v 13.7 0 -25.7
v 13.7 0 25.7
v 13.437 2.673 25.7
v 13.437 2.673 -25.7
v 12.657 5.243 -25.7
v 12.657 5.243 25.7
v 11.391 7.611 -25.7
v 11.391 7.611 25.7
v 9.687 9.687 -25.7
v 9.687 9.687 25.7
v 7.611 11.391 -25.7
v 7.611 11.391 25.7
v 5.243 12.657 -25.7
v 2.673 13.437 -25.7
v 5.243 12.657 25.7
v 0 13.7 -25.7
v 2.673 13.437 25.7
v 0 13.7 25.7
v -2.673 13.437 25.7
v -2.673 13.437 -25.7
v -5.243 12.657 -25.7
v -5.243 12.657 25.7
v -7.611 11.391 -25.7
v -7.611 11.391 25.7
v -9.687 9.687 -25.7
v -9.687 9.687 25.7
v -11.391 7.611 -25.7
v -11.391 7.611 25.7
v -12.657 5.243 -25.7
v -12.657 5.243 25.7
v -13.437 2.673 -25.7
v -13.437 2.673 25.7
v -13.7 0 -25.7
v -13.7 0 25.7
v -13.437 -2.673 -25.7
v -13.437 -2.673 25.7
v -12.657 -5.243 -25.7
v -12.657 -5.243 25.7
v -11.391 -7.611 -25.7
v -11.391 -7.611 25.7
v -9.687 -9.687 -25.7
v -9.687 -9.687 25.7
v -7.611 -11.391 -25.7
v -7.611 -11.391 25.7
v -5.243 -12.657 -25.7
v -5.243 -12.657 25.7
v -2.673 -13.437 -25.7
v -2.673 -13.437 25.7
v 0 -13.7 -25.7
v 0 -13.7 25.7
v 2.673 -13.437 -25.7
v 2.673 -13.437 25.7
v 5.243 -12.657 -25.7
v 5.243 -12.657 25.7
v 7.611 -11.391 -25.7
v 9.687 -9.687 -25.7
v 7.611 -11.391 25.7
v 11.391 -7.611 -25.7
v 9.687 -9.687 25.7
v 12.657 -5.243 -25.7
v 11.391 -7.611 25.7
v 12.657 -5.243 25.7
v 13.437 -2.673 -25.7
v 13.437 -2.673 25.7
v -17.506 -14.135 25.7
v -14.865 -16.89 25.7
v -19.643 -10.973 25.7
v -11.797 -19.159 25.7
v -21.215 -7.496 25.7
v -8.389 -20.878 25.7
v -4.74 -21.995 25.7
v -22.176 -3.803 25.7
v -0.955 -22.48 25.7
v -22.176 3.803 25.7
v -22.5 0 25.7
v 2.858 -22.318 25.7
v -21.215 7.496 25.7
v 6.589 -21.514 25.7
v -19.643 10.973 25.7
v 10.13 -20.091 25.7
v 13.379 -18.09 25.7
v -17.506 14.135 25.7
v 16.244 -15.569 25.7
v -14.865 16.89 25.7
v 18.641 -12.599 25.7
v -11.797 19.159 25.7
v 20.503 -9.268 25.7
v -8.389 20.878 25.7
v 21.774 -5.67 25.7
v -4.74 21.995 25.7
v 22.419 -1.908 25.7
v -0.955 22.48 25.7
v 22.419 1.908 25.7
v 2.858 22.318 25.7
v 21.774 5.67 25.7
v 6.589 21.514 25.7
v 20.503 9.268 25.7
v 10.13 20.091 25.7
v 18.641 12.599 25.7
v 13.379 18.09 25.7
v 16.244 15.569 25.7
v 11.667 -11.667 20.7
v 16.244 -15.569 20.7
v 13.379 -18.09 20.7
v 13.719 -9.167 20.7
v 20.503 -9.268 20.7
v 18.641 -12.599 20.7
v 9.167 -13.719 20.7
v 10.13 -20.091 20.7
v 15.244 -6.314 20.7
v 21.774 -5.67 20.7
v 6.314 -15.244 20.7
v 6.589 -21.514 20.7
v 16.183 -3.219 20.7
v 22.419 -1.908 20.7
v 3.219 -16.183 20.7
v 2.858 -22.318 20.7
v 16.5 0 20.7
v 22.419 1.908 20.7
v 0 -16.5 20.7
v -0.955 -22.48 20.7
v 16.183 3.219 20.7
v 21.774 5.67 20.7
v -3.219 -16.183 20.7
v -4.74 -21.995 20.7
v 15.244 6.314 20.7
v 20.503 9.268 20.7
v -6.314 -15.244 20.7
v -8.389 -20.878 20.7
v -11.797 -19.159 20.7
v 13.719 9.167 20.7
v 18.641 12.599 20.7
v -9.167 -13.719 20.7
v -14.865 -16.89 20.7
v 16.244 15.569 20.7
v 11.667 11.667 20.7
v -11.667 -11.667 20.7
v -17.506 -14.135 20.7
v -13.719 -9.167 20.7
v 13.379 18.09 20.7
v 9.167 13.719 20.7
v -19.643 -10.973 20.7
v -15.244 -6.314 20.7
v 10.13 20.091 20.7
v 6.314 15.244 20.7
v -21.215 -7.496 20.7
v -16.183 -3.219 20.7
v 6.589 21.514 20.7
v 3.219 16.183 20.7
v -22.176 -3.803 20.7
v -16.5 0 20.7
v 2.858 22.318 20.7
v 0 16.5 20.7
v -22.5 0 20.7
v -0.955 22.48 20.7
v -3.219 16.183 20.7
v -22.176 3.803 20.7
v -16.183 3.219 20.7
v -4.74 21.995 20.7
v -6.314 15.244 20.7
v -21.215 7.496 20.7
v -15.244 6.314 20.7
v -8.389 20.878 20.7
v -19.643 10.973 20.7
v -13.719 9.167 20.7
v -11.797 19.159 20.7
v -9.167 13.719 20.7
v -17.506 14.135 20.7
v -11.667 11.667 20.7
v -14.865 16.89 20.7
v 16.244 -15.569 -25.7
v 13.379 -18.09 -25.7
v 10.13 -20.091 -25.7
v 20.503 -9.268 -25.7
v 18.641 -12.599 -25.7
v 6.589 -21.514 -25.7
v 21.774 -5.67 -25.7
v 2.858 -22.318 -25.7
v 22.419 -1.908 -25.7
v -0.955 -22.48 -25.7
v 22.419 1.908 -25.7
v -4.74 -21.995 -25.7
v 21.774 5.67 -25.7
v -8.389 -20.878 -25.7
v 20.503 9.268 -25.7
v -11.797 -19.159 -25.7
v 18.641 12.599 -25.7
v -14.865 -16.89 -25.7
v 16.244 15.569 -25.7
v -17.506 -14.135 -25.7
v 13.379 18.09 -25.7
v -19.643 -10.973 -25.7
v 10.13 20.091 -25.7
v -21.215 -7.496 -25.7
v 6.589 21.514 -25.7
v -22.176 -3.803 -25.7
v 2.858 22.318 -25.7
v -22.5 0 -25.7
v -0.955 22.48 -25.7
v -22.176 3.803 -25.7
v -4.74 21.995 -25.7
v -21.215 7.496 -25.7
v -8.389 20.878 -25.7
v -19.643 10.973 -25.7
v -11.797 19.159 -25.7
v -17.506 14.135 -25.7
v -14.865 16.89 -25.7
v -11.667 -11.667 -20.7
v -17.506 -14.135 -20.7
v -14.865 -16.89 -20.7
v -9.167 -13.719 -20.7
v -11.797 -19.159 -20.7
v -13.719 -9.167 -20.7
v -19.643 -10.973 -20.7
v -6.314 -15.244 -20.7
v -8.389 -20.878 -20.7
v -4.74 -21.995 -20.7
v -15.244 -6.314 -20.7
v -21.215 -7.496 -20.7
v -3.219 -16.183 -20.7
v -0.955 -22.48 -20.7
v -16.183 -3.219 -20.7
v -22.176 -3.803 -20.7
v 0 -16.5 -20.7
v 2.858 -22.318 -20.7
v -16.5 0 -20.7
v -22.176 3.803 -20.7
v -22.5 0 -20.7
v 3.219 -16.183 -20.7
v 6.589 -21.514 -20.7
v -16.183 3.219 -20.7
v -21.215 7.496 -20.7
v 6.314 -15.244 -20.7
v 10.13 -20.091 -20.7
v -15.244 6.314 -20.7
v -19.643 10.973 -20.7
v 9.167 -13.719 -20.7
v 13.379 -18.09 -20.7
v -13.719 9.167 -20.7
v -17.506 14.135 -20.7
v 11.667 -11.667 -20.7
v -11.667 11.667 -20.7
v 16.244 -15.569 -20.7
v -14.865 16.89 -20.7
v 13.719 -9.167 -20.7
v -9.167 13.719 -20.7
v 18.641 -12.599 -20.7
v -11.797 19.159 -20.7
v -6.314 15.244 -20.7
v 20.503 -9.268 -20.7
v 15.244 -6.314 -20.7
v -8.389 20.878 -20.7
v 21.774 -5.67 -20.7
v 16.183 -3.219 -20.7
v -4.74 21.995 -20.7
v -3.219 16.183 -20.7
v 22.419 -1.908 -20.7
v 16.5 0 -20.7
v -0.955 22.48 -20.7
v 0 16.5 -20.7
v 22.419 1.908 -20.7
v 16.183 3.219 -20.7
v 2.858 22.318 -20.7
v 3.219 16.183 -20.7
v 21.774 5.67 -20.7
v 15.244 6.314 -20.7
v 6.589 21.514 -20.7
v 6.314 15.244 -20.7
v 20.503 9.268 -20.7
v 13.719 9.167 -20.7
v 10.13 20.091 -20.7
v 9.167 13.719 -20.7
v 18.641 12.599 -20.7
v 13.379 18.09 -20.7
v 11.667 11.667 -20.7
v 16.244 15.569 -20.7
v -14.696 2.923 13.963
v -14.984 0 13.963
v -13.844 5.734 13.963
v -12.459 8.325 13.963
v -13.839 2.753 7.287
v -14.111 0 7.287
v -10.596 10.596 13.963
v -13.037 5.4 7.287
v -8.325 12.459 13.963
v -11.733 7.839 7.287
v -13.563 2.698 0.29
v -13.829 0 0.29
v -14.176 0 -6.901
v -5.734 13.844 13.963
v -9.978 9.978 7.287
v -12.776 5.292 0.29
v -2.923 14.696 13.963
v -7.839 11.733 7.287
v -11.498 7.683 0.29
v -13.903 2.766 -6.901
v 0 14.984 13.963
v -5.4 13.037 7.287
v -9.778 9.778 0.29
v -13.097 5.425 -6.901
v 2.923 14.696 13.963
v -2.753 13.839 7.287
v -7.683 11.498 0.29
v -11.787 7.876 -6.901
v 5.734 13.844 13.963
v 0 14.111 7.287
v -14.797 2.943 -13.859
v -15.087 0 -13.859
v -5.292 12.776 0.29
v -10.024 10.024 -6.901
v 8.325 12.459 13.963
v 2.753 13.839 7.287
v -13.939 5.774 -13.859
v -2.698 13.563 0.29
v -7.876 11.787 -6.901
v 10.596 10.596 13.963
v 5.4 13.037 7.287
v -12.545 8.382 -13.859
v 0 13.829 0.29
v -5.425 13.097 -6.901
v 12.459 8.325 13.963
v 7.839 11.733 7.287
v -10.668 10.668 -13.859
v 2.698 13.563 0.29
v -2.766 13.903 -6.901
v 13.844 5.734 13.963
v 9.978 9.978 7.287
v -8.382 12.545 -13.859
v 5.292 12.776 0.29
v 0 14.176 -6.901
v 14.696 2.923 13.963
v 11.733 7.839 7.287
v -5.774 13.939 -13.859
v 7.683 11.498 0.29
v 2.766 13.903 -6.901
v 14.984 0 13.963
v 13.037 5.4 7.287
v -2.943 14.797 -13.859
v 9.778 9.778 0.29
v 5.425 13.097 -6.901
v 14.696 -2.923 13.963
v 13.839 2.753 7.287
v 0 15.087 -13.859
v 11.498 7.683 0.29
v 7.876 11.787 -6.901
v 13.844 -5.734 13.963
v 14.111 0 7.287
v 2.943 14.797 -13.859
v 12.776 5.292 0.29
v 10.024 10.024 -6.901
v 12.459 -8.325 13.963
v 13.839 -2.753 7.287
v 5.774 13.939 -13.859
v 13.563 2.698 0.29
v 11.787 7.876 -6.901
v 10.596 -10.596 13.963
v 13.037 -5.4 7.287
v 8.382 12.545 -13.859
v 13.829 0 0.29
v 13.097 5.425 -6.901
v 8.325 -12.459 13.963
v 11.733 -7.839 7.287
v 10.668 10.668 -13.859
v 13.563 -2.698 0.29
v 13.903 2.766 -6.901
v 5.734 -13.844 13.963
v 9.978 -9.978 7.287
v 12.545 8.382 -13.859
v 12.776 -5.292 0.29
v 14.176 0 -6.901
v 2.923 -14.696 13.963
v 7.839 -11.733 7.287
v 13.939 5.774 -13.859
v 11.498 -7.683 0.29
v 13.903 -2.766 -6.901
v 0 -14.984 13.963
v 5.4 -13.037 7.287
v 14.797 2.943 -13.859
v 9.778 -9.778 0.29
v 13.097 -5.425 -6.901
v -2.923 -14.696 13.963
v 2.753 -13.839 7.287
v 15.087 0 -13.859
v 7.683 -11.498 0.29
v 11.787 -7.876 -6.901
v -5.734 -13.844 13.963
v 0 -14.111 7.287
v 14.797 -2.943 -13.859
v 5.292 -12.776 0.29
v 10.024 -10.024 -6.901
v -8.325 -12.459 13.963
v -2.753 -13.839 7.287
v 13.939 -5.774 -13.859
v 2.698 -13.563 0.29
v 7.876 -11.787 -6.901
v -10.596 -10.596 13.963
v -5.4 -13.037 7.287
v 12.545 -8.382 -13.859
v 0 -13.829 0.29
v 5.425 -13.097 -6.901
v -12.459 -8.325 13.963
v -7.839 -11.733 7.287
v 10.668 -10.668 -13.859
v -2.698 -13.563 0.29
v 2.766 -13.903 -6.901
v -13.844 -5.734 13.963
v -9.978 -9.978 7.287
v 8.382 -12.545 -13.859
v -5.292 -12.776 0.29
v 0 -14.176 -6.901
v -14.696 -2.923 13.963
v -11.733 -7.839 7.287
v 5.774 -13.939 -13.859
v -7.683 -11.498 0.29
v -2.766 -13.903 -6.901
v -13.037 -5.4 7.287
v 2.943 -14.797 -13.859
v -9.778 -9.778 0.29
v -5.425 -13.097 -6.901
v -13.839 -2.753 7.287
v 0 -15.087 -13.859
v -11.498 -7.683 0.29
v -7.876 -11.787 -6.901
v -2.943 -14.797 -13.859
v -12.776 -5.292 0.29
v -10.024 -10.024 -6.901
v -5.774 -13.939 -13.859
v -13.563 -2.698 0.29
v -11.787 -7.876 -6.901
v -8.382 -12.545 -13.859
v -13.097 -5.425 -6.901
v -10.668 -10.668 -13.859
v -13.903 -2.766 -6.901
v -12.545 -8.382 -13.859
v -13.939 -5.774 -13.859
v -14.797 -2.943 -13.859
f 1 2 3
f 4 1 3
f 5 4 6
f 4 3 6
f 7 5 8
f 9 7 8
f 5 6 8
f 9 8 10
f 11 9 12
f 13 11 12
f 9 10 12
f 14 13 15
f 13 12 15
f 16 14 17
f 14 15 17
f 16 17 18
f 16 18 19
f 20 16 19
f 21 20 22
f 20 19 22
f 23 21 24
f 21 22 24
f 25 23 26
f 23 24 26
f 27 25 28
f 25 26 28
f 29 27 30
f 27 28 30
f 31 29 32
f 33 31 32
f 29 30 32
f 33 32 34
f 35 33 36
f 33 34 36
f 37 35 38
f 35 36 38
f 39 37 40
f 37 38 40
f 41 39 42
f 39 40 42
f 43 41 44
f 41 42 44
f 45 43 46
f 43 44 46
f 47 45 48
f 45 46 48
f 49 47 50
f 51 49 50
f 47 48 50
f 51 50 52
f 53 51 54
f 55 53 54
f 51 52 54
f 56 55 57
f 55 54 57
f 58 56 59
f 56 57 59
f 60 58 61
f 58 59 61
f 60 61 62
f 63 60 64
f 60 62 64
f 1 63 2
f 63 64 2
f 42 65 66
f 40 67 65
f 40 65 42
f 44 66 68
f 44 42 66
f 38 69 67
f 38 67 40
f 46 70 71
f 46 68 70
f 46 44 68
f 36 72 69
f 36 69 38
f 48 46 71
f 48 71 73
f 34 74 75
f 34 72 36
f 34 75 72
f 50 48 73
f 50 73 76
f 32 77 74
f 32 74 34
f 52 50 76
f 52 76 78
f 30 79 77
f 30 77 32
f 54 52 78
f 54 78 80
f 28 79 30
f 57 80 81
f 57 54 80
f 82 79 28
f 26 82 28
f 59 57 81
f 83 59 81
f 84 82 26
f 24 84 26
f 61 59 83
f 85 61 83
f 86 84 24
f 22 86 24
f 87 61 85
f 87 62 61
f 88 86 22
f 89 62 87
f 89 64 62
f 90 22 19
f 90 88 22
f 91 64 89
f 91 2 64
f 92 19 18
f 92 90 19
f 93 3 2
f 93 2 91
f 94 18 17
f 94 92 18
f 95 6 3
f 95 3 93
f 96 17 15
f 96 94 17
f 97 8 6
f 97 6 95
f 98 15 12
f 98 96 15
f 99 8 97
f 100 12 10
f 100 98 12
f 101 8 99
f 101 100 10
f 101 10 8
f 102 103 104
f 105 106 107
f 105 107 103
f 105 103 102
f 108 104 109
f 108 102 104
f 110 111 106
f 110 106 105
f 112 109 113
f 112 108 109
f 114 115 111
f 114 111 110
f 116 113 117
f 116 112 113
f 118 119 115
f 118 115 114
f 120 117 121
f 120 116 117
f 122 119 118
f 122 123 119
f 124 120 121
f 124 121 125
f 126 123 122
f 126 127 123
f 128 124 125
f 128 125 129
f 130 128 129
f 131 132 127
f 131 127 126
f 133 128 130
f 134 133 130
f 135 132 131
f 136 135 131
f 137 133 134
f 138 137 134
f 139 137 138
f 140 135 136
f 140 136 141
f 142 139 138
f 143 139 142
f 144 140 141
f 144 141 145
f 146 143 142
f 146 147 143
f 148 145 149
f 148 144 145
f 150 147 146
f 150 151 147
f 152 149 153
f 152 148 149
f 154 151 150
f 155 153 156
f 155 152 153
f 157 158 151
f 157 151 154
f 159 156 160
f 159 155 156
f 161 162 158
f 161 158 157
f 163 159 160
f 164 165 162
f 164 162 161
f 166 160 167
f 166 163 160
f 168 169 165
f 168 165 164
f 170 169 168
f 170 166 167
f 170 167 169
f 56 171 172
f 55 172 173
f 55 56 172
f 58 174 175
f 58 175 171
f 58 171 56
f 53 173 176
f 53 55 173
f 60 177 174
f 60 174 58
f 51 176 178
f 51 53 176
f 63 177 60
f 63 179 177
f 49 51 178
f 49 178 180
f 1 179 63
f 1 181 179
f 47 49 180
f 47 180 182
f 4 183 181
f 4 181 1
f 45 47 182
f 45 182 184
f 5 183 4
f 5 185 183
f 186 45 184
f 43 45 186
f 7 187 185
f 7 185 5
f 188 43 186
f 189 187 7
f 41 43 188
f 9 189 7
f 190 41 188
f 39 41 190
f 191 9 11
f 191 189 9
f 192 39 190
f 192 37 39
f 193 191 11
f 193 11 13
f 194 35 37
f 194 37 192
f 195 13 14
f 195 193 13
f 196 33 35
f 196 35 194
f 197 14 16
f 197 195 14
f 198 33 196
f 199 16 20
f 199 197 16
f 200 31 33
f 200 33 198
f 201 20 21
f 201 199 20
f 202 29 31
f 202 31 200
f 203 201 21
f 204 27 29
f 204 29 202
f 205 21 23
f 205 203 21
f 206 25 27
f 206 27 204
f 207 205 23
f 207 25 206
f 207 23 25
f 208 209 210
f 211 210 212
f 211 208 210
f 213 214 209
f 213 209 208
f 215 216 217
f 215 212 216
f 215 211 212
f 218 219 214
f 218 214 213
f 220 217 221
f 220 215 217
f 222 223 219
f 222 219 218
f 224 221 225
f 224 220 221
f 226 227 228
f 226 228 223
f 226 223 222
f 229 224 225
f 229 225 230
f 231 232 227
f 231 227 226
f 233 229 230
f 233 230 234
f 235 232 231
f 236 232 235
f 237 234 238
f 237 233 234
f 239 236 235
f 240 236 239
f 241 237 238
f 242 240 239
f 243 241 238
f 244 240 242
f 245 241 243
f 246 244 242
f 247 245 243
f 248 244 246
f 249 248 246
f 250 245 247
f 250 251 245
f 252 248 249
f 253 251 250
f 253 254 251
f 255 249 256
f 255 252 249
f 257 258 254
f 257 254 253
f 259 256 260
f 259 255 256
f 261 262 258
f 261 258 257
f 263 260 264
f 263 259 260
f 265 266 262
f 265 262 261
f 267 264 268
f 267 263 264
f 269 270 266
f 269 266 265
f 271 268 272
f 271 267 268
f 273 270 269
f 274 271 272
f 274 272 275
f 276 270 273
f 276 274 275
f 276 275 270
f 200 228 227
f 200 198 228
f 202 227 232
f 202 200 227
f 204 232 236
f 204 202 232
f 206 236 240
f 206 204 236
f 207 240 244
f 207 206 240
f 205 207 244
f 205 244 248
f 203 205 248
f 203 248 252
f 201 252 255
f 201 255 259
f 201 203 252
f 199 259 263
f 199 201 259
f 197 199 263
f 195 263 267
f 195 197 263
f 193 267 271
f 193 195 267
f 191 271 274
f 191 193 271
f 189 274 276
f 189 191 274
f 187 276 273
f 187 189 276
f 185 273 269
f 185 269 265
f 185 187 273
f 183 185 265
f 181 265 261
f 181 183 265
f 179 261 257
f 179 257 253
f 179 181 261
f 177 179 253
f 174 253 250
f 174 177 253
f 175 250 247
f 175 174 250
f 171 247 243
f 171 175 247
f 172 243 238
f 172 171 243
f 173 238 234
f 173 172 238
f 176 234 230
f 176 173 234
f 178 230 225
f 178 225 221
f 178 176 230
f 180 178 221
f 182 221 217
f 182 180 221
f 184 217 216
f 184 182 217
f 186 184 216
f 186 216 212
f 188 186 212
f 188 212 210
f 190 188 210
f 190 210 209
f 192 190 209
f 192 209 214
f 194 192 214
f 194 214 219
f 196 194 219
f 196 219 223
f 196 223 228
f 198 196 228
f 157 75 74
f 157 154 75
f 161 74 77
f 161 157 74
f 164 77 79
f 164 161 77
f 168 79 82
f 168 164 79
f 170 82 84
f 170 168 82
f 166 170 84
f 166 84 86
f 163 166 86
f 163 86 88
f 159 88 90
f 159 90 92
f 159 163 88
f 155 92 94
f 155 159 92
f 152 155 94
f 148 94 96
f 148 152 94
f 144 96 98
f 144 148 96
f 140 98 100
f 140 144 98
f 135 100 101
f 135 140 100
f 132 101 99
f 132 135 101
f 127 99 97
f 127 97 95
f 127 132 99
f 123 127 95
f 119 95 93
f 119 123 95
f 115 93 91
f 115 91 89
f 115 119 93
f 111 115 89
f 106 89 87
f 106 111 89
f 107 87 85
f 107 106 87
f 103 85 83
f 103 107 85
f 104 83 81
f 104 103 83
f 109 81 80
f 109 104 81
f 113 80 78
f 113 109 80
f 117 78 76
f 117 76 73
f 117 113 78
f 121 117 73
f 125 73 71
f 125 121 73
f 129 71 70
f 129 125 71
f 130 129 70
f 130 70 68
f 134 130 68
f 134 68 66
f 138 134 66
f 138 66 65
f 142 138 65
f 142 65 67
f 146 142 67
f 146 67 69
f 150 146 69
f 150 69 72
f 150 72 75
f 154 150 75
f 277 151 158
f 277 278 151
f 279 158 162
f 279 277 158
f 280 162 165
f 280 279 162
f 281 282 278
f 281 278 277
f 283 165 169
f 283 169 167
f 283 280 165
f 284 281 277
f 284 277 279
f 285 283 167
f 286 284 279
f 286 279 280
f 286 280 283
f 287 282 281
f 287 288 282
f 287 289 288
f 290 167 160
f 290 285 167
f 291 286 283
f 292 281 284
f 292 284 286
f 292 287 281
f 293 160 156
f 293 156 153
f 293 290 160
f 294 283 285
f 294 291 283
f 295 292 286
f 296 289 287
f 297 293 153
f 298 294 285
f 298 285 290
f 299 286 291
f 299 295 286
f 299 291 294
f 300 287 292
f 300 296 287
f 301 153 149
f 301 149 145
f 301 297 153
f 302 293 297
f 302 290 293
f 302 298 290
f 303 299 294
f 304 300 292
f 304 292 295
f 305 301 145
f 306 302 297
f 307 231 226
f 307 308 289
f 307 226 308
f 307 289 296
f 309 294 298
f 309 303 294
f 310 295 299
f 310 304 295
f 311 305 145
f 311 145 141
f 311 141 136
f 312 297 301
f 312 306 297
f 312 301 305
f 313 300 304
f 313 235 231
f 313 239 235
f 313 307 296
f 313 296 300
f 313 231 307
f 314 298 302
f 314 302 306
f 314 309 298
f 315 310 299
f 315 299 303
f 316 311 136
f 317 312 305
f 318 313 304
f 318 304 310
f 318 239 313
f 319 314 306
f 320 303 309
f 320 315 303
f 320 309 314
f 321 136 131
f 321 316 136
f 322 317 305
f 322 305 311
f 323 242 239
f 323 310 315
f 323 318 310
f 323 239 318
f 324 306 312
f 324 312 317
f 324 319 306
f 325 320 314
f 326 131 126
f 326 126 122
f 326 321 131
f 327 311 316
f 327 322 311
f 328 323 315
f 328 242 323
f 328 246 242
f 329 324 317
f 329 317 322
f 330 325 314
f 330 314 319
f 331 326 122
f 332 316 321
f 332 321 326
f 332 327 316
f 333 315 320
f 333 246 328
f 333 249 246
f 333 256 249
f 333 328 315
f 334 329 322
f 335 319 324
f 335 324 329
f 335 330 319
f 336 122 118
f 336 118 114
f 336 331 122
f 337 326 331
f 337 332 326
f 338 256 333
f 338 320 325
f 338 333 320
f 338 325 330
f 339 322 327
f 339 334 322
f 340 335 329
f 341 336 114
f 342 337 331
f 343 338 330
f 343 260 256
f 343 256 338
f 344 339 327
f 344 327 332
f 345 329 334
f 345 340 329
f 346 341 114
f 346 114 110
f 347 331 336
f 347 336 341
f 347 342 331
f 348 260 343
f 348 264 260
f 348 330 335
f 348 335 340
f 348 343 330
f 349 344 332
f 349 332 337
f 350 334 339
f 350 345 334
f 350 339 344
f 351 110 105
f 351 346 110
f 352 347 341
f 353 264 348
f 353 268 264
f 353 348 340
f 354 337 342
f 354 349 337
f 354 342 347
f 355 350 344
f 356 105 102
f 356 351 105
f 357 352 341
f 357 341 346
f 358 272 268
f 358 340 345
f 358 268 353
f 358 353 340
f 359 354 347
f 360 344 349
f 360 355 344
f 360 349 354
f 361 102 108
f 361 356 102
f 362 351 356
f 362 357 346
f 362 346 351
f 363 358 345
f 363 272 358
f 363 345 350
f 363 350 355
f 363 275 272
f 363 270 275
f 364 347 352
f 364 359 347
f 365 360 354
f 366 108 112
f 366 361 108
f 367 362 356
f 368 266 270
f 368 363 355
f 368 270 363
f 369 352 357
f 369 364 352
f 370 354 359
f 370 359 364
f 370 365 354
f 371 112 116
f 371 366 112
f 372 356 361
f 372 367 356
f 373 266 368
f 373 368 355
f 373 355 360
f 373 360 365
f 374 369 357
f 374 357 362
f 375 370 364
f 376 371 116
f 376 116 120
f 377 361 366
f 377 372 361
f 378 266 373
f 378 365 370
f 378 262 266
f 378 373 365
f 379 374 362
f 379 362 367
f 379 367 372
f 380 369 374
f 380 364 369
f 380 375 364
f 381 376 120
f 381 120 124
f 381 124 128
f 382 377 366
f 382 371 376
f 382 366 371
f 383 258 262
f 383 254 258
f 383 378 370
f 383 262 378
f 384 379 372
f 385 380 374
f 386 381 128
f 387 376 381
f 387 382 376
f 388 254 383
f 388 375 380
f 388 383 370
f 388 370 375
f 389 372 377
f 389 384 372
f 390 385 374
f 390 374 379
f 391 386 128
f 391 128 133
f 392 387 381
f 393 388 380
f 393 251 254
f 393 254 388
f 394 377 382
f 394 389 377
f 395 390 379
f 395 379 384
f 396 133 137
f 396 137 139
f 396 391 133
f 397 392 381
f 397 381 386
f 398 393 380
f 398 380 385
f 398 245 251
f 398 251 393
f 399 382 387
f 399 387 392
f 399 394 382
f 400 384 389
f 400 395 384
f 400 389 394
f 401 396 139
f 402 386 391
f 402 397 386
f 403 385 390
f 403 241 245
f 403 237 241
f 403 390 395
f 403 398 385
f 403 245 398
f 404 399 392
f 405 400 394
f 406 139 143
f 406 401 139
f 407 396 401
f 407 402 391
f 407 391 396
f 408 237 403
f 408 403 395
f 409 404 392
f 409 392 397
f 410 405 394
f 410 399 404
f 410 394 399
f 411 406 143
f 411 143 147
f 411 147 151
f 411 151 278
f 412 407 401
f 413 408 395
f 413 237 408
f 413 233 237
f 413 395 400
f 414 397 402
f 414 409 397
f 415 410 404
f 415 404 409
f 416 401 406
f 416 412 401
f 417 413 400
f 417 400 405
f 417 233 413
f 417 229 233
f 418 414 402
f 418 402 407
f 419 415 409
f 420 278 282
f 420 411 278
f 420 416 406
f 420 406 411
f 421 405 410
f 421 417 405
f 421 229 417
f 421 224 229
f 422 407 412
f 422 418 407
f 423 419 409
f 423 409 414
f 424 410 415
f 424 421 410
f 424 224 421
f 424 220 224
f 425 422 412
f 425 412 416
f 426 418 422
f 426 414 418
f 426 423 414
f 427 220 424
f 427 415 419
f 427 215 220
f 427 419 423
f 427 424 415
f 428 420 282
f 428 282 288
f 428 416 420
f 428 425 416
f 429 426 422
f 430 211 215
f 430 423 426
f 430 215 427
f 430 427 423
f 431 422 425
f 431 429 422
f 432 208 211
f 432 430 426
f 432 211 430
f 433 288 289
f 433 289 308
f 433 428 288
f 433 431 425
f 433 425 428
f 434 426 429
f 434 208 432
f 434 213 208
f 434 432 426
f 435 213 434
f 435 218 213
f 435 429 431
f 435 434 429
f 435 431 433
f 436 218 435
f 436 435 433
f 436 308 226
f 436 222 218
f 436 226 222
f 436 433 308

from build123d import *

# Parameters (mm, degrees)
F2_R     = 13.7
F3_DEPTH = 51.4


with BuildPart() as f1:
    # F0 (on Front) → F1 (revolve)
    with BuildSketch(Plane.XZ):
        with BuildLine():
            Line((0, -25.7), (0, 0))
            Line((0, 0), (0, 25.7))
            Line((0, 25.7), (-22.5, 25.7))
            Line((-22.5, 25.7), (-22.5, 20.7))
            Line((-22.5, 20.7), (-16.5, 20.7))
            add(Edge.make_bspline(
                [(-16.5, 20.7), (-12.589287, 6.428571), (-13.303572, -7.5), (-16.5, -20.7)],
                knots=[0, 0, 0, 0, 41.4, 41.4, 41.4, 41.4], degree=3))
            Line((-16.5, -20.7), (-22.5, -20.7))
            Line((-22.5, -20.7), (-22.5, -25.7))
            Line((-22.5, -25.7), (0, -25.7))
        make_face()
    revolve(axis=Axis((0, 0, -12.85), (0, 0, -1)))

    # F2 (on face) → F3 (cut, through all)
    with BuildSketch(Plane.XY.offset(25.7)):
        Circle(F2_R)
    extrude(amount=-F3_DEPTH, mode=Mode.SUBTRACT)


solid = f1.part
